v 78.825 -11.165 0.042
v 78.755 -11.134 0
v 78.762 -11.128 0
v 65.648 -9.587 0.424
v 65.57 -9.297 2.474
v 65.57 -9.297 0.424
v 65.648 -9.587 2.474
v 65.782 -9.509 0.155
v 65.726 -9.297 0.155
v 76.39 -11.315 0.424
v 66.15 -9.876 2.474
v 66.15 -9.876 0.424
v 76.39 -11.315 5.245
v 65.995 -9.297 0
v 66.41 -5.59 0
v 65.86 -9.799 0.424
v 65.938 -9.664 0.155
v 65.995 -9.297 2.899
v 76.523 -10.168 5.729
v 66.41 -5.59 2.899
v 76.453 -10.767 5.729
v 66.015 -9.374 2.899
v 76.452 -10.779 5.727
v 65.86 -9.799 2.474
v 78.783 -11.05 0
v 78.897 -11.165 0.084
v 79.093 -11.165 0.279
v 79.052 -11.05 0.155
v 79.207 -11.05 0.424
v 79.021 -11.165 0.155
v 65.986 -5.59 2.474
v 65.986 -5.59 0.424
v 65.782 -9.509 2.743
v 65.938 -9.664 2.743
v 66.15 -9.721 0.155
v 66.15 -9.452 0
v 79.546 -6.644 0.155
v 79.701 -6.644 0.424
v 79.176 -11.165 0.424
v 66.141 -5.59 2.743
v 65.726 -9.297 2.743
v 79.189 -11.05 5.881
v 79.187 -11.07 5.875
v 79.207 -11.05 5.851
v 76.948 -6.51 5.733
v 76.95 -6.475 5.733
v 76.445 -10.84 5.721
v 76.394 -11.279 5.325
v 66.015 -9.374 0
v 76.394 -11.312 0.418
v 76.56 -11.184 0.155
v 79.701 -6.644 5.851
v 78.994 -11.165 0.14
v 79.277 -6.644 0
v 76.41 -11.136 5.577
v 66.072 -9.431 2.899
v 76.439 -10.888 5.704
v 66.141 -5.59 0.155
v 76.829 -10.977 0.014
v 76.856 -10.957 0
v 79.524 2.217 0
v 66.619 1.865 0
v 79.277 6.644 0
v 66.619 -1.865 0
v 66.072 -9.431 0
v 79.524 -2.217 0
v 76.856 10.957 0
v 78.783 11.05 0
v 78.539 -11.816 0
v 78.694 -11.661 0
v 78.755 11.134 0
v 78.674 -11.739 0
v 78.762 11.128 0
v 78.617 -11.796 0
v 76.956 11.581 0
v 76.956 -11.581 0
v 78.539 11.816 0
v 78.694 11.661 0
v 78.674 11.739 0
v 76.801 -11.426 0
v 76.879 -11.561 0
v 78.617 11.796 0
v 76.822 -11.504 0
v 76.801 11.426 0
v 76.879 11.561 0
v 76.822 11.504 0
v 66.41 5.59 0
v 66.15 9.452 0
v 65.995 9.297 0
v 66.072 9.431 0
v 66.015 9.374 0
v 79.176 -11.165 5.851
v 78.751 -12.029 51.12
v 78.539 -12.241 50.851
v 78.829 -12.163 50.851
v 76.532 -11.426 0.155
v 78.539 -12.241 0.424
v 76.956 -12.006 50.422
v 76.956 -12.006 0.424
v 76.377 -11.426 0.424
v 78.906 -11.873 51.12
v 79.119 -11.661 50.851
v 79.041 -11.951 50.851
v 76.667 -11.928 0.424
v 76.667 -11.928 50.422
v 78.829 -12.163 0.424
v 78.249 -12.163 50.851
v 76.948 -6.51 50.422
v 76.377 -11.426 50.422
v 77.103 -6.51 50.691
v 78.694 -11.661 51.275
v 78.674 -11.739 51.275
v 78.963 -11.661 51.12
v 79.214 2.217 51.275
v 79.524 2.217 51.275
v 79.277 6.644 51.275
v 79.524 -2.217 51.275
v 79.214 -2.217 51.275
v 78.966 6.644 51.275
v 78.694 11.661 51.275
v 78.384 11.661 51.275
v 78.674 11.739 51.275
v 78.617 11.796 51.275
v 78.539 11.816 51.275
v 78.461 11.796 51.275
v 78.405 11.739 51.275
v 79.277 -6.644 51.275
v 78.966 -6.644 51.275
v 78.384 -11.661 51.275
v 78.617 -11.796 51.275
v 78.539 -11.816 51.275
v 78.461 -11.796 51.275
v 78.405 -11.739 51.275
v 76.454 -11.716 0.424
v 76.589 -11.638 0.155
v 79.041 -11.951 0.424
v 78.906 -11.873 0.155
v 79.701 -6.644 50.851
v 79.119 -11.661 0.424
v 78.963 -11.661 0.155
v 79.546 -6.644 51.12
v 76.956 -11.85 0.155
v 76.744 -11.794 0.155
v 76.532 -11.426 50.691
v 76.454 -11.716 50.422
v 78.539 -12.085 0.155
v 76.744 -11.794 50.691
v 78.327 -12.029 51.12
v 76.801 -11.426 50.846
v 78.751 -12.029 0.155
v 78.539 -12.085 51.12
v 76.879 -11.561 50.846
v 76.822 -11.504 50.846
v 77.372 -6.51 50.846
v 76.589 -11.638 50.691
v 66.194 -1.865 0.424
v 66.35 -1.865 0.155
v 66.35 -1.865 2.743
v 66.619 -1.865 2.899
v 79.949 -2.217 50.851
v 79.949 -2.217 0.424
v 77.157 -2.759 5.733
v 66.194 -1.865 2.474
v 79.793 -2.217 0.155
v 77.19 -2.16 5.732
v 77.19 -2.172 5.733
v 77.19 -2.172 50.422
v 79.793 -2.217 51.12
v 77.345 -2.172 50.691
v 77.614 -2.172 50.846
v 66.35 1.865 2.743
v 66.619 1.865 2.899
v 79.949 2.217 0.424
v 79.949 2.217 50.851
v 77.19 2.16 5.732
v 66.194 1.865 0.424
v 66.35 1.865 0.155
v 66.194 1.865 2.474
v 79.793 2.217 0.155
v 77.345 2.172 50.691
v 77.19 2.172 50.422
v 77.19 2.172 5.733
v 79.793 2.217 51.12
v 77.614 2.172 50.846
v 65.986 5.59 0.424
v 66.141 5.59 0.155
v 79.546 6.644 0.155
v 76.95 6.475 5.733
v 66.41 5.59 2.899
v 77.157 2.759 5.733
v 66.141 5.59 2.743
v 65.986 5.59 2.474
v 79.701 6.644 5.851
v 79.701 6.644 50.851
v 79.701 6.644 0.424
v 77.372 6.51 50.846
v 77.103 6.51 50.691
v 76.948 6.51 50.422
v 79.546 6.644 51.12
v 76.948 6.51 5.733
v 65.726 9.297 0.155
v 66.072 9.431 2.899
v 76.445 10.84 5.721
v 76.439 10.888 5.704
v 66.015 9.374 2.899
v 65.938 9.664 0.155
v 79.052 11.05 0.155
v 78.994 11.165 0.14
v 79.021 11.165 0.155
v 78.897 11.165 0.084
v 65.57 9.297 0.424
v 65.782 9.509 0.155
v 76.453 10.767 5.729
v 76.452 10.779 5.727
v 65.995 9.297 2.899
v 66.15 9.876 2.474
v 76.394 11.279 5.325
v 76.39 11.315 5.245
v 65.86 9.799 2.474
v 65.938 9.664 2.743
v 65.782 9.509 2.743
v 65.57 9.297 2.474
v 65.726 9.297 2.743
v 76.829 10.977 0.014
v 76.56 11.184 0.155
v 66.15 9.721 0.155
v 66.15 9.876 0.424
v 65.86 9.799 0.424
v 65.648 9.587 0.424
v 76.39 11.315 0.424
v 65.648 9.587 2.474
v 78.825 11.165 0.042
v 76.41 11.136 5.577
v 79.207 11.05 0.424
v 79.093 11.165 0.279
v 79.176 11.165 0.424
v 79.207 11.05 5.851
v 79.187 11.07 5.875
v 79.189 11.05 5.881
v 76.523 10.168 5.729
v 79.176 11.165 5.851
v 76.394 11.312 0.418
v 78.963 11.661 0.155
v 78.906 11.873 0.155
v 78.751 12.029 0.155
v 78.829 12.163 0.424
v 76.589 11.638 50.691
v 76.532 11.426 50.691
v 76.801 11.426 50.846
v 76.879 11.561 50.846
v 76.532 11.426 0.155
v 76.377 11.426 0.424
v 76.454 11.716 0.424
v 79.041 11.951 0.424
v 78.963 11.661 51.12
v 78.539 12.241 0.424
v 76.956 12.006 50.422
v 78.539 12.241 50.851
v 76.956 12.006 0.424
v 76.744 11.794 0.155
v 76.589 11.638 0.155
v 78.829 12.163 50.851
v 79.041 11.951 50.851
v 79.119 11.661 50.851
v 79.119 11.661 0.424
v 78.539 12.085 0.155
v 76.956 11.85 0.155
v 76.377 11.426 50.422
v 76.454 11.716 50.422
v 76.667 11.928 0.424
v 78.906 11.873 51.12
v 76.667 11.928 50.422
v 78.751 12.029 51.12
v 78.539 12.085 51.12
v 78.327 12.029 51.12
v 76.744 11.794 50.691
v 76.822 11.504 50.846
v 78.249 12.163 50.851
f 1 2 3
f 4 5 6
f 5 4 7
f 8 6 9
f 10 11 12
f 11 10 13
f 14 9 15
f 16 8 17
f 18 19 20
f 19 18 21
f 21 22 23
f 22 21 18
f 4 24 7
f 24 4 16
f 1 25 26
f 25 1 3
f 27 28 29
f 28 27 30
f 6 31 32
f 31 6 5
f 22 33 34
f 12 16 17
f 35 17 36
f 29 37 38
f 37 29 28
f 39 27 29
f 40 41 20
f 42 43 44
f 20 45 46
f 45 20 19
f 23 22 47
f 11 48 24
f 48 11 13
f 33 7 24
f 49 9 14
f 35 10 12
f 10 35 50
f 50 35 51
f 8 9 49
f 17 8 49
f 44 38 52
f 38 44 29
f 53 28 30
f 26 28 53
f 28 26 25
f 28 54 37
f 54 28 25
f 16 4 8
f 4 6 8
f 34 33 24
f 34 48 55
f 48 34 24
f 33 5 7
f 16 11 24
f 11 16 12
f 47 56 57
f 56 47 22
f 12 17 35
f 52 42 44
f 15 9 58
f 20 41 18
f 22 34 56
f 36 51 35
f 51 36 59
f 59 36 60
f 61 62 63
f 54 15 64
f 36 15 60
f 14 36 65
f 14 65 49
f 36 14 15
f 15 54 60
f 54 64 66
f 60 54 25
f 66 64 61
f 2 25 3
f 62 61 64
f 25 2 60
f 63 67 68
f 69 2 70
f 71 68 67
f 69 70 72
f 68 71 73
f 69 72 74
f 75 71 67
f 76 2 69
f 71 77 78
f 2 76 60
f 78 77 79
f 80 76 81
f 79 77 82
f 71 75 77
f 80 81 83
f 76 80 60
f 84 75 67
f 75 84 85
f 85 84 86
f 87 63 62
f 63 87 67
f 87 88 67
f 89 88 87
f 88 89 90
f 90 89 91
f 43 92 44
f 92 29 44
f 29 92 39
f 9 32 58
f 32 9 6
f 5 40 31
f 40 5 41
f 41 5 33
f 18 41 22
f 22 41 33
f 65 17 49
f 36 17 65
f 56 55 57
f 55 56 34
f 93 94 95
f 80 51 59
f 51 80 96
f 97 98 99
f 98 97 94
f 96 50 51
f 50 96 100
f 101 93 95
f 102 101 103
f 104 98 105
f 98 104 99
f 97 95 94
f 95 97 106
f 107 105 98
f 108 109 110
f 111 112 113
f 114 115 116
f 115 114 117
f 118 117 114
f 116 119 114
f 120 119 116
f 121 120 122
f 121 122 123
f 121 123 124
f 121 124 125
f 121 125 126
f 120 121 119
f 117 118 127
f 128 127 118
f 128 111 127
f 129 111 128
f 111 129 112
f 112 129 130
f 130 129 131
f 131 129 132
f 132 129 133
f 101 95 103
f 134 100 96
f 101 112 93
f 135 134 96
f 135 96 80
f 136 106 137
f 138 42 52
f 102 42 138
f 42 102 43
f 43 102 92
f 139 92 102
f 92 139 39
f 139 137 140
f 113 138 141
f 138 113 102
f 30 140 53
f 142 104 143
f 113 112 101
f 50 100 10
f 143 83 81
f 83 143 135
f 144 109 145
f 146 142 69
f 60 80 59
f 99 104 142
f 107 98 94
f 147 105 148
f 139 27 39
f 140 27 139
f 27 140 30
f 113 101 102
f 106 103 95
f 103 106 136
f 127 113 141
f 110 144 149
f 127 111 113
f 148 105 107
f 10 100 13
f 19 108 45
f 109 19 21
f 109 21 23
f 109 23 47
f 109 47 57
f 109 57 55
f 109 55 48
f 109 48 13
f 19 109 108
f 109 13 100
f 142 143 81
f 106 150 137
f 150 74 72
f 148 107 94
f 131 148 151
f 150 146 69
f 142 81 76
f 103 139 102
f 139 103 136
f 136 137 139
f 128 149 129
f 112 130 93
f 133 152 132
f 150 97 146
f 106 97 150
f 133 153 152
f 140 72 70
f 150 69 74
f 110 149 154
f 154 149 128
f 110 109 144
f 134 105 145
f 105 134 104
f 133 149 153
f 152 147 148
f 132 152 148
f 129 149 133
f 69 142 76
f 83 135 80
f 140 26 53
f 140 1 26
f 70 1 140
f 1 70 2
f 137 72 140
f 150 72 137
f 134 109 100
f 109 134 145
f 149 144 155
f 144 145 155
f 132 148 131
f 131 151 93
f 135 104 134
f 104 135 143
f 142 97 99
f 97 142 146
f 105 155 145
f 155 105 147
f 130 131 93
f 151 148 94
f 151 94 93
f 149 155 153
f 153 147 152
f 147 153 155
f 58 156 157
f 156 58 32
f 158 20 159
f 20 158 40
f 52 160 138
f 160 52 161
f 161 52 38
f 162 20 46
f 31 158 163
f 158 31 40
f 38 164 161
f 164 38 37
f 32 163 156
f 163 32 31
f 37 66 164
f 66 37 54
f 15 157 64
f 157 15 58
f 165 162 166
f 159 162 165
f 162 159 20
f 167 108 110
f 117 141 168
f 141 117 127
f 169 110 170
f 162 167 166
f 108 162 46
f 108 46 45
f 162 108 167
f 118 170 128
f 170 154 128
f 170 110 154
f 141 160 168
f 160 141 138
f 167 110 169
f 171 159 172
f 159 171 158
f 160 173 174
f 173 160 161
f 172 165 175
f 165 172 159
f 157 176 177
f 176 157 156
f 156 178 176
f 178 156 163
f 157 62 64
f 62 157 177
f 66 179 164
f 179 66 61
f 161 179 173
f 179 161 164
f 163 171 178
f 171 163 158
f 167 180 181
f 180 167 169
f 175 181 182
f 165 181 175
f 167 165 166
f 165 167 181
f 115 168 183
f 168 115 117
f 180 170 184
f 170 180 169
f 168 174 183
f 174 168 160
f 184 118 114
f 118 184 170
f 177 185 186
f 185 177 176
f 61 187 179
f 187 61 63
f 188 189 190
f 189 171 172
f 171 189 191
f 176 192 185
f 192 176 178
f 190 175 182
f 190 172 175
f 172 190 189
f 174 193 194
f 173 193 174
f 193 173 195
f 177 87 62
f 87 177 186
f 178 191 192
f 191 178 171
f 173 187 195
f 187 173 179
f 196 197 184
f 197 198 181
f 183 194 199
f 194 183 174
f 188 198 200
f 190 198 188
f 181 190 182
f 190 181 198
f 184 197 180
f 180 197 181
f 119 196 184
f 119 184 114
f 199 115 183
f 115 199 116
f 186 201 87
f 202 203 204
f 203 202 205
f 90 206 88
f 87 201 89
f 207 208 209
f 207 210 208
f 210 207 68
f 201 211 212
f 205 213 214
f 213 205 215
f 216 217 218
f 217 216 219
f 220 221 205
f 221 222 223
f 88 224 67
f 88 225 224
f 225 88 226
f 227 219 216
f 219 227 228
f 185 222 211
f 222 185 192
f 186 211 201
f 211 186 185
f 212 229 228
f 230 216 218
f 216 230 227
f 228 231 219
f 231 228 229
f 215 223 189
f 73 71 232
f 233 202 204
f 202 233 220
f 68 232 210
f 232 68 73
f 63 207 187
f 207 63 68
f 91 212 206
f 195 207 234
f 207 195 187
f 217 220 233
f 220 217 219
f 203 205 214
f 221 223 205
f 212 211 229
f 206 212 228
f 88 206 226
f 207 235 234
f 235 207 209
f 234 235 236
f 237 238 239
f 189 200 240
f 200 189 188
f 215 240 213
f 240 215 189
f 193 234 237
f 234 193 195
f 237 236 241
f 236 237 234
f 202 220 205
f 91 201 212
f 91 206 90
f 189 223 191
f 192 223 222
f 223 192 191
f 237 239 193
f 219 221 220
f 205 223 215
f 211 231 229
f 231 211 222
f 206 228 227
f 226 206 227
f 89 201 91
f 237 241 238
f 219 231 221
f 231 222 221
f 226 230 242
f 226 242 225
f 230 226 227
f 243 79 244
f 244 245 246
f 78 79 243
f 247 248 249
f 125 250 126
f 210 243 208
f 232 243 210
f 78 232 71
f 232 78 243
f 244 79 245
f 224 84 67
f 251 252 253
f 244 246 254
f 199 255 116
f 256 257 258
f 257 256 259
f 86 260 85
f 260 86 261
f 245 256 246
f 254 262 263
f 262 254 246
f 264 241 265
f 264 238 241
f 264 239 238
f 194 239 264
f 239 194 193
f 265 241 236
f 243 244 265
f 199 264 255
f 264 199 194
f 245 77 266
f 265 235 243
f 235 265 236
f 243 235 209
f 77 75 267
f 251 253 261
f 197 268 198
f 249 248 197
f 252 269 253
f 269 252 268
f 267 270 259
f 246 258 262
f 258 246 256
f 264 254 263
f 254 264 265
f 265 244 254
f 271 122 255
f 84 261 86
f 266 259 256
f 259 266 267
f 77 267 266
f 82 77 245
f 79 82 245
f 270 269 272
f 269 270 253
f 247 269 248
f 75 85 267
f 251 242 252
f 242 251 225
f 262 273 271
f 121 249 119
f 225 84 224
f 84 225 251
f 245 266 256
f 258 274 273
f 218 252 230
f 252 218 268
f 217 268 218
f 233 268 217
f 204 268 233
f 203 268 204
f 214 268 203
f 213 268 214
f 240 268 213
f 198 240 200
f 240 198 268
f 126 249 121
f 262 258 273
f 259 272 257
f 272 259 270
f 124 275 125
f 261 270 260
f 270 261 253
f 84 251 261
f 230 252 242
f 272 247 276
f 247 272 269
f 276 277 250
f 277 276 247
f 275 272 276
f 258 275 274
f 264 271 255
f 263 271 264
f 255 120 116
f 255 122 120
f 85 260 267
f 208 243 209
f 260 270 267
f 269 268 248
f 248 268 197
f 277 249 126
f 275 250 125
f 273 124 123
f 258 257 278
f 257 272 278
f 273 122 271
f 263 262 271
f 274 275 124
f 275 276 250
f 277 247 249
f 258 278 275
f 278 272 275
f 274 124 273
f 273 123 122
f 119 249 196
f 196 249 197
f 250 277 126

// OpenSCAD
// file: partial-pot-rim-soil-shield.scad
// Hand-held partial shield, millimeters. Nominal 6-inch EXAMPLE, not measured fit.
// Hold the grip throughout use; this is neither a clamp nor a pot handle.
part = "shield"; // [shield,contact_coupon]
pot_outer_radius = 76.2; // nominal 6-inch OUTSIDE rim diameter / 2
pot_inner_radius = 70.2; // EXAMPLE: measure the actual mouth and rim profile
rim_clearance = 1.0; // loose radial allowance, never an interference fit
arc_angle = 80;
wall_height = 45;
wall_thickness = 2.8;
ledge_thickness = 2.8; // thickness at the inward free drop edge
return_reach = 4; // inward beyond the measured inner rim
return_slope = 15; // degrees upward toward outside; mix returns inward
root_ball_radius = 62; // EXAMPLE clearance envelope, not plant validation
plant_clearance = 3;
grip_length = 30; // projection beyond outer wall
grip_width = 26;
grip_thickness = 5;
grip_overlap = 3;
grip_corner_radius = 6;
edge_radius = 0.6; // all exposed solid edges rounded by spherical dilation
coupon_angle = 16; // same radial contact profile, no grip
radial_facets = 96;
round_facets = 12;
grip_kernel_height = 0.01; // construction thickness; paired offsets are half this

wall_inner = pot_outer_radius + rim_clearance;
wall_outer = wall_inner + wall_thickness;
drop_radius = pot_inner_radius - return_reach;
function return_z(r) = ledge_thickness + (r-drop_radius)*tan(return_slope);

assert(part=="shield" || part=="contact_coupon", "Unknown part selector");
assert(pot_inner_radius>0 && pot_outer_radius>pot_inner_radius,
       "pot radii must be positive and outer greater than inner");
assert(rim_clearance>=0.5 && rim_clearance<=5, "rim_clearance must be 0.5..5");
assert(arc_angle>=30 && arc_angle<=120, "arc_angle must be 30..120");
assert(coupon_angle>=10 && coupon_angle<=20 && coupon_angle<arc_angle,
       "coupon_angle must be 10..20 and smaller than arc_angle");
assert(wall_height>=20 && wall_height<=80, "wall_height must be 20..80");
assert(wall_thickness>=2.4 && ledge_thickness>=2.4 && grip_thickness>=3,
       "wall, ledge and grip must preserve minimum thickness");
assert(return_reach>=2 && return_reach<=12, "return_reach must be 2..12");
assert(return_slope>=8 && return_slope<=30, "return_slope must be 8..30");
assert(root_ball_radius>=0 && plant_clearance>=2 &&
       drop_radius>=root_ball_radius+plant_clearance,
       "return edge must clear the declared plant envelope");
assert(grip_length>=20 && grip_length<=50 && grip_width>=18 && grip_width<=40,
       "grip length/width outside handled prototype range");
assert(grip_overlap>=2 && grip_overlap<=wall_thickness+rim_clearance,
       "grip_overlap must connect within the external wall/ledge");
assert(edge_radius>=0.3 &&
       2*edge_radius<min(wall_thickness,ledge_thickness) &&
       2*edge_radius+grip_kernel_height<grip_thickness,
       "edge_radius must leave an intact core");
assert(grip_corner_radius>edge_radius &&
       2*grip_corner_radius<min(grip_width,grip_length+grip_overlap),
       "grip_corner_radius must leave a rounded grip core");
assert(grip_thickness<=return_z(wall_outer),
       "grip top must stay below the outside return surface");
assert(radial_facets>=96 && radial_facets<=256 &&
       round_facets>=12 && round_facets<=32,
       "facet counts outside supported export range");

// Convex rounded sweep segments avoid a costly nonconvex whole-body Minkowski.
// Both ledge and wall use the same upward-outward top slope. Their overlapping
// volumes meet without a horizontal shelf on the soil-facing return path.
module rounded_segment(a0,a1,r0,r1,height) {
    hull() for(a=[a0,a1]) for(r=[r0,r1])
        for(z=[edge_radius,return_z(r)+height-edge_radius/cos(return_slope)])
            translate([r*cos(a),r*sin(a),z])
                sphere(r=edge_radius,$fn=round_facets);
}

module rounded_sector(angle) {
    segments = ceil(radial_facets*angle/360);
    for(i=[0:segments-1]) {
        a0 = -angle/2+i*angle/segments;
        a1 = -angle/2+(i+1)*angle/segments;
        rounded_segment(a0,a1,drop_radius+edge_radius,
                        wall_outer-edge_radius,0);
        // Stagger wall/ledge end planes by one rounding radius. Coincident
        // rounded end caps can serialize collinear zero-area STL triangles.
        end_angle = atan(edge_radius/wall_inner);
        w0 = a0-(i==0 ? end_angle : 0);
        w1 = a1+(i==segments-1 ? end_angle : 0);
        rounded_segment(w0,w1,wall_inner+edge_radius,
                        wall_outer-edge_radius,wall_height);
    }
}

module rounded_grip() {
    x0 = wall_outer-grip_overlap;
    x1 = wall_outer+grip_length;
    hull() for(x=[x0+grip_corner_radius,x1-grip_corner_radius])
        for(y=[-grip_width/2+grip_corner_radius,
                grip_width/2-grip_corner_radius])
            for(z=[edge_radius+grip_kernel_height/2,
                    grip_thickness-edge_radius-grip_kernel_height/2])
                translate([x,y,z])
                    // Rounded vertical ends plus eased upper/lower edges.
                    minkowski() {
                        cylinder(r=grip_corner_radius-edge_radius,h=grip_kernel_height,
                                 center=true,$fn=round_facets);
                        sphere(r=edge_radius,$fn=round_facets);
                    }
}

// OpenSCAD spheres omit the polar vertex; align their faceted lower plane
// with the bed rather than leaving a small first-layer gap.
round_floor = edge_radius*(1-cos(180/round_facets));
translate([0,0,-round_floor])
if(part=="shield") union() {
    rounded_sector(arc_angle);
    rounded_grip();
}
else rounded_sector(coupon_angle);
// main file
// Same radial wall/ledge/return profile. Millimeters, nominal 6-inch EXAMPLE.
include <partial-pot-rim-soil-shield.scad>
part = "contact_coupon";
